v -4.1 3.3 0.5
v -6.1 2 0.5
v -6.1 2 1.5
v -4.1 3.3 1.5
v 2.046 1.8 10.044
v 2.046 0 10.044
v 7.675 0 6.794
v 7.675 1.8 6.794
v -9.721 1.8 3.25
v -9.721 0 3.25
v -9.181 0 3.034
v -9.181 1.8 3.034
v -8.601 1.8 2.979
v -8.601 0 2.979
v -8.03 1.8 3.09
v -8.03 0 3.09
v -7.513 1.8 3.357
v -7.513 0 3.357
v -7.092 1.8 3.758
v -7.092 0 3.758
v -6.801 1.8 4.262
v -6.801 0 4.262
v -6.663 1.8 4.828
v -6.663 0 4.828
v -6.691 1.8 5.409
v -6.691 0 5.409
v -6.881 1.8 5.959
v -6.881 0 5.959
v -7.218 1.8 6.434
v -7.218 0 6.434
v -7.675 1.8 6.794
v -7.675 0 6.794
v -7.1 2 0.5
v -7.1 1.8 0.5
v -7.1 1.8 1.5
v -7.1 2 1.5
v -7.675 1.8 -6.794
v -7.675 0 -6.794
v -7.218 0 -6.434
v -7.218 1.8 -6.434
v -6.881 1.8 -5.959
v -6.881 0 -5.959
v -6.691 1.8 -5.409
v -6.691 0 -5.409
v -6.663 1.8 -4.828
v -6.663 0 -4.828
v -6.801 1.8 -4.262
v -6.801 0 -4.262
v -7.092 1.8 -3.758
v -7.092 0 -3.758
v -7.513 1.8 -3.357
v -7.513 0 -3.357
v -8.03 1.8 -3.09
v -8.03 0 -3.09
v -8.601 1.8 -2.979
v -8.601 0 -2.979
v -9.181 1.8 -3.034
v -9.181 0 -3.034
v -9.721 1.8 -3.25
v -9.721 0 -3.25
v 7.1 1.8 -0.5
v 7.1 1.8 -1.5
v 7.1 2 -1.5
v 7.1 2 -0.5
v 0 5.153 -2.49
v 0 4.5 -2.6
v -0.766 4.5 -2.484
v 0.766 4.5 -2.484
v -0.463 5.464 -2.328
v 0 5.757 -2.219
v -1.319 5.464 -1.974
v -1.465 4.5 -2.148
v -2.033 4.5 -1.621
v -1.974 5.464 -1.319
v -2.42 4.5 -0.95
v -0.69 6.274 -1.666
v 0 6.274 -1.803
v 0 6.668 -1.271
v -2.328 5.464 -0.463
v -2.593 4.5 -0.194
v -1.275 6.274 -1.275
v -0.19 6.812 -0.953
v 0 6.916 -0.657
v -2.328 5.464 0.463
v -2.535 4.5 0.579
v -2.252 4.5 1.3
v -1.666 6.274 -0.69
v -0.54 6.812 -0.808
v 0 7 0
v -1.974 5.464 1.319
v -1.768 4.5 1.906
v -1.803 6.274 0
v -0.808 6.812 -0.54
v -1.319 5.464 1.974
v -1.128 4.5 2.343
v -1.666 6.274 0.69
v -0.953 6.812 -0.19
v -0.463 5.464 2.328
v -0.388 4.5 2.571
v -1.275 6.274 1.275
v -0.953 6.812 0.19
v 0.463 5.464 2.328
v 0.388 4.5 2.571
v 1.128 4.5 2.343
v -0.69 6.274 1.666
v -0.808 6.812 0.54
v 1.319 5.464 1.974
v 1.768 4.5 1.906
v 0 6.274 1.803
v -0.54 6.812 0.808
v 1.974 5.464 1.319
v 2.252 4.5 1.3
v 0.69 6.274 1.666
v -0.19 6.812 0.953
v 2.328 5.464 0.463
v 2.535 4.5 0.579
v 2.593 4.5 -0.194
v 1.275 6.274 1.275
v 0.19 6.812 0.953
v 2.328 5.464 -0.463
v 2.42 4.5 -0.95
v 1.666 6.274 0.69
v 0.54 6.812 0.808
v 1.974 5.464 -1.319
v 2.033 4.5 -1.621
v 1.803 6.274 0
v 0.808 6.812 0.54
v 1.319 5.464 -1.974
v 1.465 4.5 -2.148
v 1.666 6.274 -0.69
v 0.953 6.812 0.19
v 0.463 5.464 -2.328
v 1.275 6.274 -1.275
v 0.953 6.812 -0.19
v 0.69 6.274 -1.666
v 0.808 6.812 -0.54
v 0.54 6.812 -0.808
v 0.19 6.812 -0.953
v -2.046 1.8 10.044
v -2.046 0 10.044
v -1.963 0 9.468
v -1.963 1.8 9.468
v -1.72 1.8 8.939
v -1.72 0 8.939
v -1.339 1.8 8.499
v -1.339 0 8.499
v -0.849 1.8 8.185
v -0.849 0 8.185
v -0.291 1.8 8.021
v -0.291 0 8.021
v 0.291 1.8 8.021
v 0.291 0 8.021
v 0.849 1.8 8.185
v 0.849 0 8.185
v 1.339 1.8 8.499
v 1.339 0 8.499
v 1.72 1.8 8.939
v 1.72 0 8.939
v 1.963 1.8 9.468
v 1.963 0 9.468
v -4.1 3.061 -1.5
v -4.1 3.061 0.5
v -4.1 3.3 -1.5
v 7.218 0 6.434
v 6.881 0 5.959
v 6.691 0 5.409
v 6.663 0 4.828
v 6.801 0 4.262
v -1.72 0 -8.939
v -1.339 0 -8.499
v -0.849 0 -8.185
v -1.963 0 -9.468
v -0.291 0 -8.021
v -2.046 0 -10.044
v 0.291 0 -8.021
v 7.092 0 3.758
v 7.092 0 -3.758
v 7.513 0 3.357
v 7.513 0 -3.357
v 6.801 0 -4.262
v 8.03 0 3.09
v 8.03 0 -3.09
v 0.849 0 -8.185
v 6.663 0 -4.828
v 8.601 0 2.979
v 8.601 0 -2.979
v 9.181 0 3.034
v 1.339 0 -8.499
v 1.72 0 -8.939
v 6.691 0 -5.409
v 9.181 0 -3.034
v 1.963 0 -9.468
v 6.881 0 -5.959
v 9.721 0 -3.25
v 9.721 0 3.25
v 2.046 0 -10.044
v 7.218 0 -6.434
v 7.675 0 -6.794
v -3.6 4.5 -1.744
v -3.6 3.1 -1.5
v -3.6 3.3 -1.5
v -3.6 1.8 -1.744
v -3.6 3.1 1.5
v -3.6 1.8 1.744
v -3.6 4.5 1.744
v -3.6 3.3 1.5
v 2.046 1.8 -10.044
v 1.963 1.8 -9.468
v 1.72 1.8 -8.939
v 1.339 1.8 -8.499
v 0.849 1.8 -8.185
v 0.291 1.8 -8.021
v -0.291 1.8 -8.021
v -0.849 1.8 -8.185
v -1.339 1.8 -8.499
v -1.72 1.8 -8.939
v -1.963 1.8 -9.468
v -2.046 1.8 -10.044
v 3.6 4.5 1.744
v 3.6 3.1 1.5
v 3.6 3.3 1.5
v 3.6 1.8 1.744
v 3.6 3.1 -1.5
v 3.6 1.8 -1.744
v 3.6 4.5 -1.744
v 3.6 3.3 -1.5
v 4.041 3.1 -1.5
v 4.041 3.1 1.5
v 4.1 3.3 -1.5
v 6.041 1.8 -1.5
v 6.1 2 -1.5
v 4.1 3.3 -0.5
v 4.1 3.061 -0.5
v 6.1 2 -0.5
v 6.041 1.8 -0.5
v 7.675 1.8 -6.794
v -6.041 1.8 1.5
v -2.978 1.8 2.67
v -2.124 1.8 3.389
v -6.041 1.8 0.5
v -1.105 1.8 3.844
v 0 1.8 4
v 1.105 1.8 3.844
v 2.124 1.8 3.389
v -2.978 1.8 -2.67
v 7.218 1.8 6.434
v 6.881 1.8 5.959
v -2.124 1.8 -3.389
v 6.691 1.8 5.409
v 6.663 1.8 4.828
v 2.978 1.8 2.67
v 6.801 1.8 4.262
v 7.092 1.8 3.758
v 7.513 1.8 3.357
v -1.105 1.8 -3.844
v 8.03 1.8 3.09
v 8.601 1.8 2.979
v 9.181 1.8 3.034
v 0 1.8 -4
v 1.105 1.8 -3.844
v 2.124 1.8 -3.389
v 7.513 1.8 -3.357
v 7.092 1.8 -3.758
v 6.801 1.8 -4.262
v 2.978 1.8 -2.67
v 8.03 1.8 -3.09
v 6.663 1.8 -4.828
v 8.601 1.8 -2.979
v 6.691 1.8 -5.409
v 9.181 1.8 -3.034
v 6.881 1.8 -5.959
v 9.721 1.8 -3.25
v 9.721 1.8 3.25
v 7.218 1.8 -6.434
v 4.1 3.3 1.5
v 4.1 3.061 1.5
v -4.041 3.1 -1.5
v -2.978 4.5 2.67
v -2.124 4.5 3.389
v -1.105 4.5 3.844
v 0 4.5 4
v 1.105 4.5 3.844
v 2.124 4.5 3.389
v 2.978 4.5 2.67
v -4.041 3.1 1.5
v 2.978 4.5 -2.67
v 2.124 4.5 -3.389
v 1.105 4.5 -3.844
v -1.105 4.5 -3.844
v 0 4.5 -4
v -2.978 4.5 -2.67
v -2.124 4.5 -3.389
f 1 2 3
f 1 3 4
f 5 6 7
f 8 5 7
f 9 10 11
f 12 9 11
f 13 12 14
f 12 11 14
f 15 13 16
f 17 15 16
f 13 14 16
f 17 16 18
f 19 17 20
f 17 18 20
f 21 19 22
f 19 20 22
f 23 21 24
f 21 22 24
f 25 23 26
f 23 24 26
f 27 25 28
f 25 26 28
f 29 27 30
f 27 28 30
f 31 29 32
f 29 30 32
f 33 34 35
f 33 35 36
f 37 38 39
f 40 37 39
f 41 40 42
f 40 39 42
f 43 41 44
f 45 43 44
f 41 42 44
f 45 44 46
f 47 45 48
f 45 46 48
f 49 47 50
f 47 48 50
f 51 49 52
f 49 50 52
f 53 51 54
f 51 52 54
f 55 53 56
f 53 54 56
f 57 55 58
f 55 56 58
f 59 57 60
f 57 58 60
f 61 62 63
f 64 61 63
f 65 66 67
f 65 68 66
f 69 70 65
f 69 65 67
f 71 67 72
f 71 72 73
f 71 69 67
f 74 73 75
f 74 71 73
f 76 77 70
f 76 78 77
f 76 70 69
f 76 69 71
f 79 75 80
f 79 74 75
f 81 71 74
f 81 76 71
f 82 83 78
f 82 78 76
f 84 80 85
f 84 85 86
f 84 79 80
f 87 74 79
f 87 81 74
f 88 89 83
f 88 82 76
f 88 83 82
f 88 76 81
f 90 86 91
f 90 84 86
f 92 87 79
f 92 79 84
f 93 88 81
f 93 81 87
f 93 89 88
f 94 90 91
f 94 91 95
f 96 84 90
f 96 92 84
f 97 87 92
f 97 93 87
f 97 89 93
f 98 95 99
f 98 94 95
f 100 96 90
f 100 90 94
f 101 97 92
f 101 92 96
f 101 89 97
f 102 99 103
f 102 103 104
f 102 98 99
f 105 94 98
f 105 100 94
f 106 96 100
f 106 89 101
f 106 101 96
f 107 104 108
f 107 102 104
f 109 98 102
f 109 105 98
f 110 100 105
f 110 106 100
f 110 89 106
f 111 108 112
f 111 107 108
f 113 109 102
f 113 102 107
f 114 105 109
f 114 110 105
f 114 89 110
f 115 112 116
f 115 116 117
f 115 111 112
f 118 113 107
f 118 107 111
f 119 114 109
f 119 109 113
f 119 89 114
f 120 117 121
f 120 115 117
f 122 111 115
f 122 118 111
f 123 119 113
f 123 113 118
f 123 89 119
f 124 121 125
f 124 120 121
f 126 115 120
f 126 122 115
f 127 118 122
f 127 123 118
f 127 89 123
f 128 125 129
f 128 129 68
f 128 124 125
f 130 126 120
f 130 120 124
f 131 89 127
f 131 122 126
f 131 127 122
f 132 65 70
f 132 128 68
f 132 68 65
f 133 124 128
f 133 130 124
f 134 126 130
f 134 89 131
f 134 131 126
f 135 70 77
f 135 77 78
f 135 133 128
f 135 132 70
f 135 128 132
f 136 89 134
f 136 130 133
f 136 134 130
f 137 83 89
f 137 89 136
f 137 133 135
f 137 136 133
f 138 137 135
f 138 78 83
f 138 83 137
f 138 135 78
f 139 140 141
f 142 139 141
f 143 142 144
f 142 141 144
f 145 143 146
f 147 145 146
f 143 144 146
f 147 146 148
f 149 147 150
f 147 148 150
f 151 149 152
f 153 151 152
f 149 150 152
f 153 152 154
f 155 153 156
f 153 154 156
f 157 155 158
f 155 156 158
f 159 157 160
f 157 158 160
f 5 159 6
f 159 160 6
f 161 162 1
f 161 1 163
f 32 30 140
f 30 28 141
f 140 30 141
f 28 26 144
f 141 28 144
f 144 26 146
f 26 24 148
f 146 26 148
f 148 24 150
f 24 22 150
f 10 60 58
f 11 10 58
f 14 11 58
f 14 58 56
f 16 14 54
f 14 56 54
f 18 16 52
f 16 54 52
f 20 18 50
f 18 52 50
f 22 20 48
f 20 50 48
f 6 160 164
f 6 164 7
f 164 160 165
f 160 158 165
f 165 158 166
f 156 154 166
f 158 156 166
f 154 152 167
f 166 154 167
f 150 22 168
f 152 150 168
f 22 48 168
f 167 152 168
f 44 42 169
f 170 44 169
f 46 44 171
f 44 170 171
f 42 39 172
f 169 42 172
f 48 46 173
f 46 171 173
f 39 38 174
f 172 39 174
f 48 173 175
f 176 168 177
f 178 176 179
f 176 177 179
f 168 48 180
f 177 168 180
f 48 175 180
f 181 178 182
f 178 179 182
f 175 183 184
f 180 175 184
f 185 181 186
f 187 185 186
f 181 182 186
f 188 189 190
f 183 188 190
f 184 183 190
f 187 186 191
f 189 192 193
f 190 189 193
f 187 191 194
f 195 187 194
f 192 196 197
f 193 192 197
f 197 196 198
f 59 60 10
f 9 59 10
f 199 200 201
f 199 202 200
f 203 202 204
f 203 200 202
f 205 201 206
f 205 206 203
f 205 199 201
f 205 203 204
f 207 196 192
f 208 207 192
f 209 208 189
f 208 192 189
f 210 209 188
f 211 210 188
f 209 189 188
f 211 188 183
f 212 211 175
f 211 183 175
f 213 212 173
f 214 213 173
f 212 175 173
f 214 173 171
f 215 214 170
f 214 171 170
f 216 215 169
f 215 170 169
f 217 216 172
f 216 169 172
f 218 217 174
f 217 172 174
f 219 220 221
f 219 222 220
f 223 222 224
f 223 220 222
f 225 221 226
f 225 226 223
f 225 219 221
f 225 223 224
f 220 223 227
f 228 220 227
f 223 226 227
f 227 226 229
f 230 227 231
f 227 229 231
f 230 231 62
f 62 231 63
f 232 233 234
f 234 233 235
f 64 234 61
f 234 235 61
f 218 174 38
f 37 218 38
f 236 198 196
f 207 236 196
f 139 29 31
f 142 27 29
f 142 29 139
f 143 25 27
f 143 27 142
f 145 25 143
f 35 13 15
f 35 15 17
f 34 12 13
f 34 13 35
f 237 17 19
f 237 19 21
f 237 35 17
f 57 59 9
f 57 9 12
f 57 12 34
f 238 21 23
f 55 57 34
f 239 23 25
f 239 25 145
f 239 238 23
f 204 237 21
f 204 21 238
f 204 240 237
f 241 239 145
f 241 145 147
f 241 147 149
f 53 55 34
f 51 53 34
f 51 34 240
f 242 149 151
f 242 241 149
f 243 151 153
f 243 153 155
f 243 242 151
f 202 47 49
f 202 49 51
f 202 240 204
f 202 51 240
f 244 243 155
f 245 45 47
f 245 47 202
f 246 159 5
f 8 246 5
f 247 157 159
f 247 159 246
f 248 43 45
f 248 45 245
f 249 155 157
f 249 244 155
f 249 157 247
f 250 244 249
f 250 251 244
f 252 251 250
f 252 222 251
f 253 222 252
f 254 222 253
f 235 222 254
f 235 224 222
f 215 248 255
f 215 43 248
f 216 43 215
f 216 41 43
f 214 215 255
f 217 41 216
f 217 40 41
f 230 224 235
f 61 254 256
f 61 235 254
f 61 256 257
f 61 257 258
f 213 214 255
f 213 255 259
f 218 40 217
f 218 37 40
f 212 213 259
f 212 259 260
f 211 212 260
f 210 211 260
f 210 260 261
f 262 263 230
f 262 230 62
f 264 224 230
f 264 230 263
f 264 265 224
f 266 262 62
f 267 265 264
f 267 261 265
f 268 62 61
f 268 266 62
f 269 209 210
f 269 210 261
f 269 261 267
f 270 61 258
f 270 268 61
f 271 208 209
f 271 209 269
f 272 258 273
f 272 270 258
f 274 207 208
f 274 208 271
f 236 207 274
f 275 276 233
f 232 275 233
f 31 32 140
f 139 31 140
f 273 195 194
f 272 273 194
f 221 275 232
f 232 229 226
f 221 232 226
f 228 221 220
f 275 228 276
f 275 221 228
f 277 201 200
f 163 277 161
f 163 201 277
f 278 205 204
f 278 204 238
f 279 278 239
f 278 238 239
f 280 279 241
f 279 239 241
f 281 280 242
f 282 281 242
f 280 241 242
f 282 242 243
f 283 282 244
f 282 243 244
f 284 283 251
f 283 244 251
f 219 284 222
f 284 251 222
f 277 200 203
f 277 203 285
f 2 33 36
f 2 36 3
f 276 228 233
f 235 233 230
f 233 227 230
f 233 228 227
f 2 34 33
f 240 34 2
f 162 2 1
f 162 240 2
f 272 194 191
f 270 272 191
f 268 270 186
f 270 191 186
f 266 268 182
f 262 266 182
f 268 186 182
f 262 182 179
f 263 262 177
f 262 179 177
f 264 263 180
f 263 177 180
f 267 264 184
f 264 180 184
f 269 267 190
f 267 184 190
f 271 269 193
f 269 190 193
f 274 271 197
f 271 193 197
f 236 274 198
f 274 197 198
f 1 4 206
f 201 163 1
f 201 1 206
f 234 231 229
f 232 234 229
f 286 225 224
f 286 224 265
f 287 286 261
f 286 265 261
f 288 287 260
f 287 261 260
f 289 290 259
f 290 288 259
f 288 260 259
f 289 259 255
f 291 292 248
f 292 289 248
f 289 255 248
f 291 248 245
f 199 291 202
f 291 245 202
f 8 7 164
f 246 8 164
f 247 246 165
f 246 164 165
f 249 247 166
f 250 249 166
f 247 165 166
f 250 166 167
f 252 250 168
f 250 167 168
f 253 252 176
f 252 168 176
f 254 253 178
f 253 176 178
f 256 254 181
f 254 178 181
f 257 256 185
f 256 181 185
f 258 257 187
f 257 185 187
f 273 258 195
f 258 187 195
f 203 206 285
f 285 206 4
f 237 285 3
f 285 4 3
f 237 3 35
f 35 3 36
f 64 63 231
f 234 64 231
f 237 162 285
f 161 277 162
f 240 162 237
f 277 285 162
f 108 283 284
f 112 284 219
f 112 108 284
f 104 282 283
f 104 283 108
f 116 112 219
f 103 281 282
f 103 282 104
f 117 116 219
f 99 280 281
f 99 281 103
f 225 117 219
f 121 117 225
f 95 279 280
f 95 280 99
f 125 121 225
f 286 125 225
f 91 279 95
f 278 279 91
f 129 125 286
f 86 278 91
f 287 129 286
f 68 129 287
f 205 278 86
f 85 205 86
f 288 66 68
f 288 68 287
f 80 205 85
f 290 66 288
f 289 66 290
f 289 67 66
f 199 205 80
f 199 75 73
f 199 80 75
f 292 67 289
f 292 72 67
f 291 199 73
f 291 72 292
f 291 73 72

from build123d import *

# Parameters (mm, degrees)
BOSS_EXTRUDE1_DEPTH      = 1.8
SKETCH2_R                = 4
BOSS_EXTRUDE2_DEPTH      = 2.7
CUT_EXTRUDE1_DEPTH       = 2.7
BOSS_EXTRUDE3_DEPTH      = 1.5
BOSS_EXTRUDE3_DEPTH_BACK = 1.5
CUT_EXTRUDE2_START       = -1.5
SKETCH6_W                = 3
SKETCH6_H                = 2
CUT_EXTRUDE2_DEPTH       = 1.5


with BuildPart() as part:
    # Sketch1 → Boss-Extrude1 (new body)
    with BuildSketch(Plane(origin=(0, 0, 0), x_dir=(1, 0, 0), z_dir=(0, 1, 0))):
        with BuildLine():
            Line((-9.721111048, 3.25), (-9.721111048, 0))
            Line((-9.721111048, 0), (-9.721111048, -3.25))
            ThreePointArc((-9.721111048, -3.25), (-6.92820323, -4), (-7.675138086, -6.79372912))
            Line((-7.675138086, -6.79372912), (-4.860555524, -8.41872912))
            Line((-4.860555524, -8.41872912), (-2.045972962, -10.04372912))
            ThreePointArc((-2.045972962, -10.04372912), (0, -8), (2.045972962, -10.04372912))
            Line((2.045972962, -10.04372912), (4.860555524, -8.41872912))
            Line((4.860555524, -8.41872912), (7.675138086, -6.79372912))
            ThreePointArc((7.675138086, -6.79372912), (6.92820323, -4), (9.721111048, -3.25))
            Line((9.721111048, -3.25), (9.721111048, 0))
            Line((9.721111048, 0), (9.721111048, 3.25))
            ThreePointArc((9.721111048, 3.25), (6.92820323, 4), (7.675138086, 6.79372912))
            Line((7.675138086, 6.79372912), (4.860555524, 8.41872912))
            Line((4.860555524, 8.41872912), (2.045972962, 10.04372912))
            ThreePointArc((2.045972962, 10.04372912), (0, 8), (-2.045972962, 10.04372912))
            Line((-2.045972962, 10.04372912), (-4.860555524, 8.41872912))
            Line((-4.860555524, 8.41872912), (-7.675138086, 6.79372912))
            ThreePointArc((-7.675138086, 6.79372912), (-6.92820323, 4), (-9.721111048, 3.25))
        make_face()
    extrude(amount=BOSS_EXTRUDE1_DEPTH)

    # Sketch2 → Boss-Extrude2 (add)
    with BuildSketch(Plane(origin=(0, 1.8, 0), x_dir=(1, 0, 0), z_dir=(0, 1, 0))):
        with Locations(Location((0, 0, 0), (0, 0, 90))):
            Circle(SKETCH2_R)
    extrude(amount=BOSS_EXTRUDE2_DEPTH)

    # Sketch3 → Cut-Extrude1 (cut)
    with BuildSketch(Plane(origin=(0, 4.5, 0), x_dir=(1, 0, 0), z_dir=(0, 1, 0))):
        Polygon((-3.6, 5.061910399), (-3.6, -4.956827899), (3.6, -4.956827899), (3.6, 5.287050586), (4.769441753, 5.287050586), (4.769441753, -6.054386309), (-4.641273363, -6.054386309), (-4.641273363, 5.061910399), align=None)
    extrude(amount=-CUT_EXTRUDE1_DEPTH, mode=Mode.SUBTRACT)

    # Sketch4 → Revolve1 (revolve)
    with BuildSketch(Plane(origin=(0, 0, 0), x_dir=(0, 0, -1), z_dir=(1, 0, 0))):
        with BuildLine():
            Line((0, 7), (0, 4.5))
            Line((0, 4.5), (2.6, 4.5))
            ThreePointArc((2.6, 4.5), (1.80346888, 6.273607635), (0, 7))
        make_face()
    revolve(axis=Axis((0, 0, 0), (0, 1, 0)))

    # Sketch5 → Boss-Extrude3 (add, two sides: drawn at the far end of the back side and taken through both)
    with BuildSketch(Plane.XY.offset(-BOSS_EXTRUDE3_DEPTH_BACK)):
        Polygon((3.6, 3.3), (3.6, 3.1), (4.040711986, 3.1), (6.040711986, 1.8), (7.1, 1.8), (7.1, 2), (6.1, 2), (4.1, 3.3), align=None)
        Polygon((-7.1, 1.8), (-7.1, 2), (-6.1, 2), (-4.1, 3.3), (-3.6, 3.3), (-3.6, 3.1), (-4.040711986, 3.1), (-6.040711986, 1.8), align=None)
    extrude(amount=BOSS_EXTRUDE3_DEPTH + BOSS_EXTRUDE3_DEPTH_BACK)

    # Sketch6 → Cut-Extrude2 (cut)
    with BuildSketch(Plane(origin=(0, 3.3, 0), x_dir=(1, 0, 0), z_dir=(0, 1, 0)).offset(CUT_EXTRUDE2_START)):
        with Locations((-5.6, 0.5)):
            Rectangle(SKETCH6_W, SKETCH6_H)
        with Locations((5.6, -0.5)):
            Rectangle(SKETCH6_W, SKETCH6_H)
    extrude(amount=CUT_EXTRUDE2_DEPTH, mode=Mode.SUBTRACT)


solid = part.part
